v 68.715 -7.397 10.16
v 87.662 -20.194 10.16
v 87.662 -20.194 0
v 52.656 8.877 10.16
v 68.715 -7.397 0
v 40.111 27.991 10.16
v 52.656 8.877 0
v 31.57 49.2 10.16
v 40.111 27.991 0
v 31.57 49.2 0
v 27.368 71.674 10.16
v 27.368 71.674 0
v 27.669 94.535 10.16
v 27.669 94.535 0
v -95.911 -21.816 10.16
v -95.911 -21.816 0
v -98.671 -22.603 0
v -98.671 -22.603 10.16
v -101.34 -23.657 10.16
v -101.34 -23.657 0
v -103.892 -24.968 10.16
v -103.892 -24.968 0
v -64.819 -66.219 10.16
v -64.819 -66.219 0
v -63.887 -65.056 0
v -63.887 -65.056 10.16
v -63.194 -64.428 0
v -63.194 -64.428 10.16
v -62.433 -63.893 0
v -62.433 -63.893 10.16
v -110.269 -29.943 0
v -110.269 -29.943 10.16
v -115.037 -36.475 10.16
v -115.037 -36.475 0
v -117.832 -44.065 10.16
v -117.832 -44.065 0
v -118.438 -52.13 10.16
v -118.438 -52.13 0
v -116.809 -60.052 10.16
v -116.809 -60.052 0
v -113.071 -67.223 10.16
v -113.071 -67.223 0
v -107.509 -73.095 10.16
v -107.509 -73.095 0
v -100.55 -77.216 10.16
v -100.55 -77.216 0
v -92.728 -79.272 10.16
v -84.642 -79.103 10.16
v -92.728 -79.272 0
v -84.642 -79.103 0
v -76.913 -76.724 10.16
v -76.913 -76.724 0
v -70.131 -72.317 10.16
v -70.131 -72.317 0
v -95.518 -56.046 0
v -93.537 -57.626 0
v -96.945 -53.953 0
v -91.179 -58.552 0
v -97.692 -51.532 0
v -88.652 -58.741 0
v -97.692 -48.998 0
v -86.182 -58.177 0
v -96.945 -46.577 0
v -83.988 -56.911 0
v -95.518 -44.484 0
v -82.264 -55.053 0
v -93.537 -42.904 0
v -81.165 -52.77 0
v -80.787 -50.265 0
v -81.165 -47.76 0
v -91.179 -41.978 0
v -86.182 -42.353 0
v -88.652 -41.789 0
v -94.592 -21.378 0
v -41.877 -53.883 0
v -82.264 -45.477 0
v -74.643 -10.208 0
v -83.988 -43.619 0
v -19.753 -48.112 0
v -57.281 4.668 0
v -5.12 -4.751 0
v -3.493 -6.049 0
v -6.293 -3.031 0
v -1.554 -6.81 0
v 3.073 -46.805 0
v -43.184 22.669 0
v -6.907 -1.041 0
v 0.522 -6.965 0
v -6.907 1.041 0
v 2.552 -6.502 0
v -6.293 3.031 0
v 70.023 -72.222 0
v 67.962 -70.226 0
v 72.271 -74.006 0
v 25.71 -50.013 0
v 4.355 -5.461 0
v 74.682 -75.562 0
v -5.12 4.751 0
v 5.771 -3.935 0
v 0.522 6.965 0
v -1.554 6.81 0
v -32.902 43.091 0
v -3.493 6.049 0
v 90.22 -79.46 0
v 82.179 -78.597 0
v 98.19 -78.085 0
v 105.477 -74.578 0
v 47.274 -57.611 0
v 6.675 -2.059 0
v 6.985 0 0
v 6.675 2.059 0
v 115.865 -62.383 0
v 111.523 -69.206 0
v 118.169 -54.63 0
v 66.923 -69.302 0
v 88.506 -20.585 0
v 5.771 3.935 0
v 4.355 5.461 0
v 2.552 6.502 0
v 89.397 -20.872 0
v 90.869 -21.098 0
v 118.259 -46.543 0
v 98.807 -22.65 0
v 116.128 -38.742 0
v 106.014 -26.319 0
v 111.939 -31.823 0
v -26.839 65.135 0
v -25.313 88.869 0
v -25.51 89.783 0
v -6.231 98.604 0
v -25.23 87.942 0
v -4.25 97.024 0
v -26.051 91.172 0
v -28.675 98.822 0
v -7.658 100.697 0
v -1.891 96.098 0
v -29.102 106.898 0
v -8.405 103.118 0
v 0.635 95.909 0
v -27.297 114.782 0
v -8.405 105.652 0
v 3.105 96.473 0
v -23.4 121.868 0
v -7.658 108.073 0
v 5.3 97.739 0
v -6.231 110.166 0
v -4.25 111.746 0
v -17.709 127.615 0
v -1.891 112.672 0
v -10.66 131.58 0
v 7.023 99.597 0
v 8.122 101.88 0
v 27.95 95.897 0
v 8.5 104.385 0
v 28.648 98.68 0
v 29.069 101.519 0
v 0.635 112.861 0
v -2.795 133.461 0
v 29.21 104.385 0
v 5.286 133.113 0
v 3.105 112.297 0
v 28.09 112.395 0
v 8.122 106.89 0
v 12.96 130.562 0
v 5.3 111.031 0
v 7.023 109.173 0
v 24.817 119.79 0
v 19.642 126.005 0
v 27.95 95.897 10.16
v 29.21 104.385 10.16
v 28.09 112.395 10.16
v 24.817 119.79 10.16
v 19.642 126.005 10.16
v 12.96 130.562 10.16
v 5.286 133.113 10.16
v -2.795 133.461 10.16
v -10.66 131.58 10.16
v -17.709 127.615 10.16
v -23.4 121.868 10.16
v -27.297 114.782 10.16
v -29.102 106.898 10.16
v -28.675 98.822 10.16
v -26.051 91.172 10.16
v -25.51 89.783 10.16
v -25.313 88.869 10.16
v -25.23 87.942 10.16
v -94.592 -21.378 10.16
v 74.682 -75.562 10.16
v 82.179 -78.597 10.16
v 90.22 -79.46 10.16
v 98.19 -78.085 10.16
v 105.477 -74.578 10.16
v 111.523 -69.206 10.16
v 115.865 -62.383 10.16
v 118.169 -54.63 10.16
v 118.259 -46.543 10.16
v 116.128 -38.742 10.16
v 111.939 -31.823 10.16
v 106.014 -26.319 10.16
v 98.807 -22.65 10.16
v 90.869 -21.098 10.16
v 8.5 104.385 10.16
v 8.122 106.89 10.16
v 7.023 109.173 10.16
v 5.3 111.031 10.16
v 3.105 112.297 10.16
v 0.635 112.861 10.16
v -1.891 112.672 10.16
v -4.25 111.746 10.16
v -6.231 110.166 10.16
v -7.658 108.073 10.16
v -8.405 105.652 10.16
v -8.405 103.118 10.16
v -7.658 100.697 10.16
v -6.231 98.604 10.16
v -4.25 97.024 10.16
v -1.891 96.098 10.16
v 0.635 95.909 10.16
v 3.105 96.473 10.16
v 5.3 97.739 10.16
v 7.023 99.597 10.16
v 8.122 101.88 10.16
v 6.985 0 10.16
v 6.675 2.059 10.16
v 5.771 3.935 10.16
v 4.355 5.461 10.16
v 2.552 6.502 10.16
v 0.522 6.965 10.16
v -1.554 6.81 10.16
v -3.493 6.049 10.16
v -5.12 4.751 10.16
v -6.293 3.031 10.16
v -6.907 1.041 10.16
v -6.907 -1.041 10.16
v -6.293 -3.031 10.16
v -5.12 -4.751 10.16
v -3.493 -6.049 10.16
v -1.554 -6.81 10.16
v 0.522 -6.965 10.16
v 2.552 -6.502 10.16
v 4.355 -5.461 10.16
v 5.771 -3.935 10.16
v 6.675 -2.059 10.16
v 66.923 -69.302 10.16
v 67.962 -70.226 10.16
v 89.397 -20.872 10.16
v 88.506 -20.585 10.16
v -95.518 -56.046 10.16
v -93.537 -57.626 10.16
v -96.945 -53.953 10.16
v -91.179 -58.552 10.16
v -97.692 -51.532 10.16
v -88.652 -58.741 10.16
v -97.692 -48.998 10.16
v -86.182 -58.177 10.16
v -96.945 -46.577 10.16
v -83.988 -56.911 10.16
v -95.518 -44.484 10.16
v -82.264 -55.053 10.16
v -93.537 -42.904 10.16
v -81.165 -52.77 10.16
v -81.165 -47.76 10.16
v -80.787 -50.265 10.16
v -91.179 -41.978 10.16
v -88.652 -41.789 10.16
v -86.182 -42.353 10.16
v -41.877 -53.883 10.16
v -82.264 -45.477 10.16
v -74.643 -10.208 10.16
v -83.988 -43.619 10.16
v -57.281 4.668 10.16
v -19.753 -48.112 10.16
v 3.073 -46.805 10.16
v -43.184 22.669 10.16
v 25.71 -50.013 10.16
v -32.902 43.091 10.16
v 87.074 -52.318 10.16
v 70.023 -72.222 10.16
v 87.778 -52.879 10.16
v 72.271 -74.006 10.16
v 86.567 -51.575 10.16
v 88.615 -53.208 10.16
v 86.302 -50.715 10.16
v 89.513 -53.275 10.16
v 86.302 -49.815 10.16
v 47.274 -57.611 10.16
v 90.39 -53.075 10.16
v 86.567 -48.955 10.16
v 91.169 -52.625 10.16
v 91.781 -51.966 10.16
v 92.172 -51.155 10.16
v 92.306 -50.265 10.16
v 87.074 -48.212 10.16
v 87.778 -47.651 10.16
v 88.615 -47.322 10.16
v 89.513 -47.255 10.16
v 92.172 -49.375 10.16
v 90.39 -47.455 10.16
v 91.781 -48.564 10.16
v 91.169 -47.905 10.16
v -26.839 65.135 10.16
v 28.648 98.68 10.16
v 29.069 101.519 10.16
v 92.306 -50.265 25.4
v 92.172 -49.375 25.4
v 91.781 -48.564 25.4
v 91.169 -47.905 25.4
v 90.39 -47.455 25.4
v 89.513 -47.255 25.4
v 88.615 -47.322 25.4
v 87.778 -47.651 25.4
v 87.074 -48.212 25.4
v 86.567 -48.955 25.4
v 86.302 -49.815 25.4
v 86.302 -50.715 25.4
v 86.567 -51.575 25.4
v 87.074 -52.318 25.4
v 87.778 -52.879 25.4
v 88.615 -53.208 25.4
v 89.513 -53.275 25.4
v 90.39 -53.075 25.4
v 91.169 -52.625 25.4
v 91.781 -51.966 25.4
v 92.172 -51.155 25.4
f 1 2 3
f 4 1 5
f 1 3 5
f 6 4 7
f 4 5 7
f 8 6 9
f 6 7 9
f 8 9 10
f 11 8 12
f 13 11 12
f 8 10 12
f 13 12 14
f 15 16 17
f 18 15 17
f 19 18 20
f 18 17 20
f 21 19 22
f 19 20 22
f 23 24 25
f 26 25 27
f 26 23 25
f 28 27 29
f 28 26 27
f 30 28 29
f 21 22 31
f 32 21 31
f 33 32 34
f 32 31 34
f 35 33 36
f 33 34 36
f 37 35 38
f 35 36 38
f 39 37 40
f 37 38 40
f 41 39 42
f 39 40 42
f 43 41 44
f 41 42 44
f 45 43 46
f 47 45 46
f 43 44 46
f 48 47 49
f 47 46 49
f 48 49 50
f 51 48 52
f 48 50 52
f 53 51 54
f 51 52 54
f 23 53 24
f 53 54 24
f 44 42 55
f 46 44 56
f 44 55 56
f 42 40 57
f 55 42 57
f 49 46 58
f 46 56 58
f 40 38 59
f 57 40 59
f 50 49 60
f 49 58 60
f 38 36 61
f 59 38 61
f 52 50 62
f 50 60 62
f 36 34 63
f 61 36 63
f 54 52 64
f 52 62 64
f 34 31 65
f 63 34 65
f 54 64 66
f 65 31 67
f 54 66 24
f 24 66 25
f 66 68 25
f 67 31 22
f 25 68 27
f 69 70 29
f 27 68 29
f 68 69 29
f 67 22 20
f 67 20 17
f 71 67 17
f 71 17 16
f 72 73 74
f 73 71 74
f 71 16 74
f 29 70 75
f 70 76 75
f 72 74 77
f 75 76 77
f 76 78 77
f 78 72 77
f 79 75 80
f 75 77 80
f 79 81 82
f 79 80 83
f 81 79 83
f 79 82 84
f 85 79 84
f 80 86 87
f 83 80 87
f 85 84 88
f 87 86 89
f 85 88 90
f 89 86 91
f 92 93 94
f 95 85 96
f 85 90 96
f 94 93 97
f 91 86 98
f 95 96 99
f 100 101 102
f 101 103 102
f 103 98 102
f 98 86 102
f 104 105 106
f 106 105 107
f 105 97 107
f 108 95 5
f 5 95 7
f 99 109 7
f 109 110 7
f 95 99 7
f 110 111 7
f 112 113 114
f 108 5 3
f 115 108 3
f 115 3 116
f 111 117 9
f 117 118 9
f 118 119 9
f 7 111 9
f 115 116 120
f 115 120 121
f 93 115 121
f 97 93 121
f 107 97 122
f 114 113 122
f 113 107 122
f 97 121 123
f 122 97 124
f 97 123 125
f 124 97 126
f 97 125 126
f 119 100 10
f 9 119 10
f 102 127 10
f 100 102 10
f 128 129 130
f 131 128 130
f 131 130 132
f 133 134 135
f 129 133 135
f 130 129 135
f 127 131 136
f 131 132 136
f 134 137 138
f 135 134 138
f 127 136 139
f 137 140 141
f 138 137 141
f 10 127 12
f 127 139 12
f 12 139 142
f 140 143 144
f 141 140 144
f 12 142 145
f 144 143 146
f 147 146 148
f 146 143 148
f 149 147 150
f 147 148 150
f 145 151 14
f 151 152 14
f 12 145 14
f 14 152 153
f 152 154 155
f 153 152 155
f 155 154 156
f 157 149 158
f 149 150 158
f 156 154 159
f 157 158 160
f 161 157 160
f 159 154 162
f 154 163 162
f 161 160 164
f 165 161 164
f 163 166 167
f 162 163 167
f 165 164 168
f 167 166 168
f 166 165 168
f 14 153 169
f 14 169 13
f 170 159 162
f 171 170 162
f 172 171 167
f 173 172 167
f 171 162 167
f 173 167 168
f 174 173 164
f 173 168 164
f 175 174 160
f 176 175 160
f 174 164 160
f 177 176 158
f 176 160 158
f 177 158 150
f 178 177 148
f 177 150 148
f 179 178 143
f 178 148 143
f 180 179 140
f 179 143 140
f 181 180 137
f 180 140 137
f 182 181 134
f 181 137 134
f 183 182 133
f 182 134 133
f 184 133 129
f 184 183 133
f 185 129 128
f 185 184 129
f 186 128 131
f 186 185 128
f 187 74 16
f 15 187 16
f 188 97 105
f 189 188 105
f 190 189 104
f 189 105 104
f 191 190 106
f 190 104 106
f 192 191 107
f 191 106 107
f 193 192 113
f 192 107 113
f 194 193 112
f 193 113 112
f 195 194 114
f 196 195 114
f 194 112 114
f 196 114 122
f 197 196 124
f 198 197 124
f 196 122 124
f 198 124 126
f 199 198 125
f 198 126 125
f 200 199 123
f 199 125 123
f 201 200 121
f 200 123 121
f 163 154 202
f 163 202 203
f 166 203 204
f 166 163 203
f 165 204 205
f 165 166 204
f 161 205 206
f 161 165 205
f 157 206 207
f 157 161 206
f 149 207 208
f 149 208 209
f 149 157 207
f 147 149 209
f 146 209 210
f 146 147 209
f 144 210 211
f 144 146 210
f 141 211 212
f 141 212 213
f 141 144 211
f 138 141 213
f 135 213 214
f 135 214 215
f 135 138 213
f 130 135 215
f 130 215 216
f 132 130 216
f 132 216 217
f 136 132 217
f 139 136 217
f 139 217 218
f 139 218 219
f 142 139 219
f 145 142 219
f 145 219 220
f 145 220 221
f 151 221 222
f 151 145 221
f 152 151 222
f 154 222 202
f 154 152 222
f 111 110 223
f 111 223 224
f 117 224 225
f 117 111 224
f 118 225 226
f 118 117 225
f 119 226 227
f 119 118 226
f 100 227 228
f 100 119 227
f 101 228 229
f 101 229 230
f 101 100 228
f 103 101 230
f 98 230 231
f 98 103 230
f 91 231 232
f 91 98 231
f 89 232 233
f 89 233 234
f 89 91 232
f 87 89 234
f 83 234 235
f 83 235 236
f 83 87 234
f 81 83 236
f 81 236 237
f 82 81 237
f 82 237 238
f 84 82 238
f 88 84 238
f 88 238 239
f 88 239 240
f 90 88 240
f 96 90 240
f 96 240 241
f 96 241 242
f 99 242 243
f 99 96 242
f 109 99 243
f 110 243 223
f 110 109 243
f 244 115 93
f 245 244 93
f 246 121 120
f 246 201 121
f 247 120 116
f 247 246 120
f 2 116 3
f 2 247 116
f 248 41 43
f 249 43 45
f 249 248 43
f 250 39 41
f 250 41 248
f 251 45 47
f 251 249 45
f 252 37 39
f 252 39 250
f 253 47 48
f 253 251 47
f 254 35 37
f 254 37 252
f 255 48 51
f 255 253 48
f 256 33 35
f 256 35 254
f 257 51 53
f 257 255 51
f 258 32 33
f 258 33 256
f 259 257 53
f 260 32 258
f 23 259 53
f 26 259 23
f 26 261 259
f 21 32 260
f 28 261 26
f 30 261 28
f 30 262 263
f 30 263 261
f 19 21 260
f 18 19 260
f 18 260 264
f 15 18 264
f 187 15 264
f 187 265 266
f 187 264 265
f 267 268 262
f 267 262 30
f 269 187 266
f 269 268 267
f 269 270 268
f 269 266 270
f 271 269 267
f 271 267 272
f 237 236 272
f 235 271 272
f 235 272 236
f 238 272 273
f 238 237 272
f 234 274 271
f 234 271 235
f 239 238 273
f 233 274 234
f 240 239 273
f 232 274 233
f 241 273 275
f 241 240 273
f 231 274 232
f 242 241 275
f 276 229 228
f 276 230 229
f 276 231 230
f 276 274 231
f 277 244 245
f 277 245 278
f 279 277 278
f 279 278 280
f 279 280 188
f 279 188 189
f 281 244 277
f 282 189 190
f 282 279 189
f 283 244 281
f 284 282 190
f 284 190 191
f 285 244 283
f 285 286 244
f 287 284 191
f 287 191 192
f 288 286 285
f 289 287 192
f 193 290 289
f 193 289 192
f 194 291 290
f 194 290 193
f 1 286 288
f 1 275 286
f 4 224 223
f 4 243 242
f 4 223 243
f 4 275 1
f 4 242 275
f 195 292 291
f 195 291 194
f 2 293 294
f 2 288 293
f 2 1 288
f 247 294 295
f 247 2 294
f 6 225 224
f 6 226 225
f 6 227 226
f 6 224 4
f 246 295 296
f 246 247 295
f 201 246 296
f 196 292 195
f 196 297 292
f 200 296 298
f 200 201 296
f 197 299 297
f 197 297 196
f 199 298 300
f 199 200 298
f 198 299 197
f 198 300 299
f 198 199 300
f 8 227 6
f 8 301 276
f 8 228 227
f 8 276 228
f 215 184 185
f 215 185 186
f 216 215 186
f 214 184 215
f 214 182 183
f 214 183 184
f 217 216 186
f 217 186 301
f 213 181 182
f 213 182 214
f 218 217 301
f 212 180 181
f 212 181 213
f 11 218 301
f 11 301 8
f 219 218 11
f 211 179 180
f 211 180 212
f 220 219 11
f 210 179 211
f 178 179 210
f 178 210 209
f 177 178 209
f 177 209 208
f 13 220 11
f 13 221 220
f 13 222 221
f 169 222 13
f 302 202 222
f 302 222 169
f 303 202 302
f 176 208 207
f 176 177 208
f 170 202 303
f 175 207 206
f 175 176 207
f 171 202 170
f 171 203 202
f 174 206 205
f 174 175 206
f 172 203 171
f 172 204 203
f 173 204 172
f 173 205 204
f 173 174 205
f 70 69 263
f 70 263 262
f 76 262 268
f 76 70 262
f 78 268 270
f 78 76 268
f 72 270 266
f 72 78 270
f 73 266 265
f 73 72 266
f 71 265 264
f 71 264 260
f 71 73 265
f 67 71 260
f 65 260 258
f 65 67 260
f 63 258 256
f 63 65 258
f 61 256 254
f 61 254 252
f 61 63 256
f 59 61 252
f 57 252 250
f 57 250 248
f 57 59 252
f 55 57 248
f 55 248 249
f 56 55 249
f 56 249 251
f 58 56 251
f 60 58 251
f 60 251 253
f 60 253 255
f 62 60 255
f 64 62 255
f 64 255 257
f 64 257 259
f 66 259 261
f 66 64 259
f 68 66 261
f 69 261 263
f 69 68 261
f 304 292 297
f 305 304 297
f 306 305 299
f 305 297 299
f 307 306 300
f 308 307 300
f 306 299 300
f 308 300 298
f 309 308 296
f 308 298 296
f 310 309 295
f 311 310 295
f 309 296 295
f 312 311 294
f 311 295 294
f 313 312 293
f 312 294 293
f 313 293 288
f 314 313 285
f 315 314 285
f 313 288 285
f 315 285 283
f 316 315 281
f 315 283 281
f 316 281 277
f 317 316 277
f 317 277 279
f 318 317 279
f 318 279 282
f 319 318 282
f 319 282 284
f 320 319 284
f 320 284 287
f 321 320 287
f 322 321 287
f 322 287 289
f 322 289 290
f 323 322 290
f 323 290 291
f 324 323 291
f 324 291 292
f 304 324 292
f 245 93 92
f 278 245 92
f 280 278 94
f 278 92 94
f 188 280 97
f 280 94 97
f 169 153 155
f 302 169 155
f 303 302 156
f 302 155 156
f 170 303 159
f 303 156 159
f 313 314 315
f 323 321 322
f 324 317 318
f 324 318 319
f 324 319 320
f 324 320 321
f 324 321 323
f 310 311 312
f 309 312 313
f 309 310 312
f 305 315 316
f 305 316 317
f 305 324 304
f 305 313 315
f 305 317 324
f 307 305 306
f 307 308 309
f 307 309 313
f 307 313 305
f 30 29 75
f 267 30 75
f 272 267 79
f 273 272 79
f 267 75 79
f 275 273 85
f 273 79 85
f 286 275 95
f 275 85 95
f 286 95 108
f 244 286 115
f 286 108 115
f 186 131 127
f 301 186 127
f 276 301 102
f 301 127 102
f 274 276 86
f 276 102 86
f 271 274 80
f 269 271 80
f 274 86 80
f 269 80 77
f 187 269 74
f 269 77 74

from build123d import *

# Parameters (mm, degrees)
F0_R     = 8.5
F0_R_2   = 6.985
F0_R_3   = 3.01878
F1_DEPTH = 10.16
F2_R     = 7.62
F3_DEPTH = 25.4


with BuildPart() as f1:
    # F0 (on Top) → F1 (new body)
    with BuildSketch(Plane.XY):
        with BuildLine():
            ThreePointArc((29.21, 104.385), (28.391776, 99.847507), (27.755027, 95.281012))
            ThreePointArc((27.755027, 95.281012), (28.843963, 99.77524), (29.21, 104.385))
        make_face()
        with BuildLine():
            ThreePointArc((89.287219, -21.055), (40.36409, 27.509427), (27.755027, 95.281012))
            ThreePointArc((27.755027, 95.281012), (28.391776, 99.847507), (29.21, 104.385))
            ThreePointArc((29.21, 104.385), (-7.560104, 132.599693), (-25.296602, 89.78))
            ThreePointArc((-25.296602, 89.78), (-42.893065, 23.129114), (-95.280447, -21.676448))
            ThreePointArc((-95.280447, -21.676448), (-99.553523, -23.408254), (-103.892219, -24.968398))
            ThreePointArc((-103.892219, -24.968398), (-109.941808, -70.919589), (-63.990617, -64.87))
            ThreePointArc((-63.990617, -64.87), (2.528975, -46.783541), (67.525421, -69.749564))
            ThreePointArc((67.525421, -69.749564), (71.161747, -72.584253), (74.682219, -75.561602))
            ThreePointArc((74.682219, -75.561602), (117.501913, -57.825104), (89.287219, -21.055))
        make_face()
        with Locations((-89.287219, -50.265)):
            Circle(F0_R, mode=Mode.SUBTRACT)
        Circle(F0_R_2, mode=Mode.SUBTRACT)
        with Locations((89.287219, -50.265)):
            Circle(F0_R_3, mode=Mode.SUBTRACT)
        with Locations((0, 104.385)):
            Circle(F0_R, mode=Mode.SUBTRACT)
        with BuildLine():
            ThreePointArc((67.525421, -69.749564), (70.873068, -72.939725), (74.682219, -75.561602))
            ThreePointArc((74.682219, -75.561602), (71.161747, -72.584253), (67.525421, -69.749564))
        make_face()
        with BuildLine():
            ThreePointArc((-103.892219, -24.968398), (-99.553523, -23.408254), (-95.280447, -21.676448))
            ThreePointArc((-95.280447, -21.676448), (-99.717031, -22.980515), (-103.892219, -24.968398))
        make_face()
    extrude(amount=F1_DEPTH)

    # F2
    f2_edges = [f1.edges().sort_by_distance(p)[0] for p in [
        (27.755027, 95.281012, 5.08),
        (-25.296602, 89.78, 5.08),
        (-63.990617, -64.87, 5.08),
        (-95.280447, -21.676448, 5.08),
        (67.525421, -69.749564, 5.08),
        (89.287219, -21.055, 5.08),
    ]]
    fillet(f2_edges, radius=F2_R)

    # F0 (on Top) → F3 (join)
    with BuildSketch(Plane.XY):
        with Locations((89.287219, -50.265)):
            Circle(F0_R_3)
    extrude(amount=F3_DEPTH)


solid = f1.part
